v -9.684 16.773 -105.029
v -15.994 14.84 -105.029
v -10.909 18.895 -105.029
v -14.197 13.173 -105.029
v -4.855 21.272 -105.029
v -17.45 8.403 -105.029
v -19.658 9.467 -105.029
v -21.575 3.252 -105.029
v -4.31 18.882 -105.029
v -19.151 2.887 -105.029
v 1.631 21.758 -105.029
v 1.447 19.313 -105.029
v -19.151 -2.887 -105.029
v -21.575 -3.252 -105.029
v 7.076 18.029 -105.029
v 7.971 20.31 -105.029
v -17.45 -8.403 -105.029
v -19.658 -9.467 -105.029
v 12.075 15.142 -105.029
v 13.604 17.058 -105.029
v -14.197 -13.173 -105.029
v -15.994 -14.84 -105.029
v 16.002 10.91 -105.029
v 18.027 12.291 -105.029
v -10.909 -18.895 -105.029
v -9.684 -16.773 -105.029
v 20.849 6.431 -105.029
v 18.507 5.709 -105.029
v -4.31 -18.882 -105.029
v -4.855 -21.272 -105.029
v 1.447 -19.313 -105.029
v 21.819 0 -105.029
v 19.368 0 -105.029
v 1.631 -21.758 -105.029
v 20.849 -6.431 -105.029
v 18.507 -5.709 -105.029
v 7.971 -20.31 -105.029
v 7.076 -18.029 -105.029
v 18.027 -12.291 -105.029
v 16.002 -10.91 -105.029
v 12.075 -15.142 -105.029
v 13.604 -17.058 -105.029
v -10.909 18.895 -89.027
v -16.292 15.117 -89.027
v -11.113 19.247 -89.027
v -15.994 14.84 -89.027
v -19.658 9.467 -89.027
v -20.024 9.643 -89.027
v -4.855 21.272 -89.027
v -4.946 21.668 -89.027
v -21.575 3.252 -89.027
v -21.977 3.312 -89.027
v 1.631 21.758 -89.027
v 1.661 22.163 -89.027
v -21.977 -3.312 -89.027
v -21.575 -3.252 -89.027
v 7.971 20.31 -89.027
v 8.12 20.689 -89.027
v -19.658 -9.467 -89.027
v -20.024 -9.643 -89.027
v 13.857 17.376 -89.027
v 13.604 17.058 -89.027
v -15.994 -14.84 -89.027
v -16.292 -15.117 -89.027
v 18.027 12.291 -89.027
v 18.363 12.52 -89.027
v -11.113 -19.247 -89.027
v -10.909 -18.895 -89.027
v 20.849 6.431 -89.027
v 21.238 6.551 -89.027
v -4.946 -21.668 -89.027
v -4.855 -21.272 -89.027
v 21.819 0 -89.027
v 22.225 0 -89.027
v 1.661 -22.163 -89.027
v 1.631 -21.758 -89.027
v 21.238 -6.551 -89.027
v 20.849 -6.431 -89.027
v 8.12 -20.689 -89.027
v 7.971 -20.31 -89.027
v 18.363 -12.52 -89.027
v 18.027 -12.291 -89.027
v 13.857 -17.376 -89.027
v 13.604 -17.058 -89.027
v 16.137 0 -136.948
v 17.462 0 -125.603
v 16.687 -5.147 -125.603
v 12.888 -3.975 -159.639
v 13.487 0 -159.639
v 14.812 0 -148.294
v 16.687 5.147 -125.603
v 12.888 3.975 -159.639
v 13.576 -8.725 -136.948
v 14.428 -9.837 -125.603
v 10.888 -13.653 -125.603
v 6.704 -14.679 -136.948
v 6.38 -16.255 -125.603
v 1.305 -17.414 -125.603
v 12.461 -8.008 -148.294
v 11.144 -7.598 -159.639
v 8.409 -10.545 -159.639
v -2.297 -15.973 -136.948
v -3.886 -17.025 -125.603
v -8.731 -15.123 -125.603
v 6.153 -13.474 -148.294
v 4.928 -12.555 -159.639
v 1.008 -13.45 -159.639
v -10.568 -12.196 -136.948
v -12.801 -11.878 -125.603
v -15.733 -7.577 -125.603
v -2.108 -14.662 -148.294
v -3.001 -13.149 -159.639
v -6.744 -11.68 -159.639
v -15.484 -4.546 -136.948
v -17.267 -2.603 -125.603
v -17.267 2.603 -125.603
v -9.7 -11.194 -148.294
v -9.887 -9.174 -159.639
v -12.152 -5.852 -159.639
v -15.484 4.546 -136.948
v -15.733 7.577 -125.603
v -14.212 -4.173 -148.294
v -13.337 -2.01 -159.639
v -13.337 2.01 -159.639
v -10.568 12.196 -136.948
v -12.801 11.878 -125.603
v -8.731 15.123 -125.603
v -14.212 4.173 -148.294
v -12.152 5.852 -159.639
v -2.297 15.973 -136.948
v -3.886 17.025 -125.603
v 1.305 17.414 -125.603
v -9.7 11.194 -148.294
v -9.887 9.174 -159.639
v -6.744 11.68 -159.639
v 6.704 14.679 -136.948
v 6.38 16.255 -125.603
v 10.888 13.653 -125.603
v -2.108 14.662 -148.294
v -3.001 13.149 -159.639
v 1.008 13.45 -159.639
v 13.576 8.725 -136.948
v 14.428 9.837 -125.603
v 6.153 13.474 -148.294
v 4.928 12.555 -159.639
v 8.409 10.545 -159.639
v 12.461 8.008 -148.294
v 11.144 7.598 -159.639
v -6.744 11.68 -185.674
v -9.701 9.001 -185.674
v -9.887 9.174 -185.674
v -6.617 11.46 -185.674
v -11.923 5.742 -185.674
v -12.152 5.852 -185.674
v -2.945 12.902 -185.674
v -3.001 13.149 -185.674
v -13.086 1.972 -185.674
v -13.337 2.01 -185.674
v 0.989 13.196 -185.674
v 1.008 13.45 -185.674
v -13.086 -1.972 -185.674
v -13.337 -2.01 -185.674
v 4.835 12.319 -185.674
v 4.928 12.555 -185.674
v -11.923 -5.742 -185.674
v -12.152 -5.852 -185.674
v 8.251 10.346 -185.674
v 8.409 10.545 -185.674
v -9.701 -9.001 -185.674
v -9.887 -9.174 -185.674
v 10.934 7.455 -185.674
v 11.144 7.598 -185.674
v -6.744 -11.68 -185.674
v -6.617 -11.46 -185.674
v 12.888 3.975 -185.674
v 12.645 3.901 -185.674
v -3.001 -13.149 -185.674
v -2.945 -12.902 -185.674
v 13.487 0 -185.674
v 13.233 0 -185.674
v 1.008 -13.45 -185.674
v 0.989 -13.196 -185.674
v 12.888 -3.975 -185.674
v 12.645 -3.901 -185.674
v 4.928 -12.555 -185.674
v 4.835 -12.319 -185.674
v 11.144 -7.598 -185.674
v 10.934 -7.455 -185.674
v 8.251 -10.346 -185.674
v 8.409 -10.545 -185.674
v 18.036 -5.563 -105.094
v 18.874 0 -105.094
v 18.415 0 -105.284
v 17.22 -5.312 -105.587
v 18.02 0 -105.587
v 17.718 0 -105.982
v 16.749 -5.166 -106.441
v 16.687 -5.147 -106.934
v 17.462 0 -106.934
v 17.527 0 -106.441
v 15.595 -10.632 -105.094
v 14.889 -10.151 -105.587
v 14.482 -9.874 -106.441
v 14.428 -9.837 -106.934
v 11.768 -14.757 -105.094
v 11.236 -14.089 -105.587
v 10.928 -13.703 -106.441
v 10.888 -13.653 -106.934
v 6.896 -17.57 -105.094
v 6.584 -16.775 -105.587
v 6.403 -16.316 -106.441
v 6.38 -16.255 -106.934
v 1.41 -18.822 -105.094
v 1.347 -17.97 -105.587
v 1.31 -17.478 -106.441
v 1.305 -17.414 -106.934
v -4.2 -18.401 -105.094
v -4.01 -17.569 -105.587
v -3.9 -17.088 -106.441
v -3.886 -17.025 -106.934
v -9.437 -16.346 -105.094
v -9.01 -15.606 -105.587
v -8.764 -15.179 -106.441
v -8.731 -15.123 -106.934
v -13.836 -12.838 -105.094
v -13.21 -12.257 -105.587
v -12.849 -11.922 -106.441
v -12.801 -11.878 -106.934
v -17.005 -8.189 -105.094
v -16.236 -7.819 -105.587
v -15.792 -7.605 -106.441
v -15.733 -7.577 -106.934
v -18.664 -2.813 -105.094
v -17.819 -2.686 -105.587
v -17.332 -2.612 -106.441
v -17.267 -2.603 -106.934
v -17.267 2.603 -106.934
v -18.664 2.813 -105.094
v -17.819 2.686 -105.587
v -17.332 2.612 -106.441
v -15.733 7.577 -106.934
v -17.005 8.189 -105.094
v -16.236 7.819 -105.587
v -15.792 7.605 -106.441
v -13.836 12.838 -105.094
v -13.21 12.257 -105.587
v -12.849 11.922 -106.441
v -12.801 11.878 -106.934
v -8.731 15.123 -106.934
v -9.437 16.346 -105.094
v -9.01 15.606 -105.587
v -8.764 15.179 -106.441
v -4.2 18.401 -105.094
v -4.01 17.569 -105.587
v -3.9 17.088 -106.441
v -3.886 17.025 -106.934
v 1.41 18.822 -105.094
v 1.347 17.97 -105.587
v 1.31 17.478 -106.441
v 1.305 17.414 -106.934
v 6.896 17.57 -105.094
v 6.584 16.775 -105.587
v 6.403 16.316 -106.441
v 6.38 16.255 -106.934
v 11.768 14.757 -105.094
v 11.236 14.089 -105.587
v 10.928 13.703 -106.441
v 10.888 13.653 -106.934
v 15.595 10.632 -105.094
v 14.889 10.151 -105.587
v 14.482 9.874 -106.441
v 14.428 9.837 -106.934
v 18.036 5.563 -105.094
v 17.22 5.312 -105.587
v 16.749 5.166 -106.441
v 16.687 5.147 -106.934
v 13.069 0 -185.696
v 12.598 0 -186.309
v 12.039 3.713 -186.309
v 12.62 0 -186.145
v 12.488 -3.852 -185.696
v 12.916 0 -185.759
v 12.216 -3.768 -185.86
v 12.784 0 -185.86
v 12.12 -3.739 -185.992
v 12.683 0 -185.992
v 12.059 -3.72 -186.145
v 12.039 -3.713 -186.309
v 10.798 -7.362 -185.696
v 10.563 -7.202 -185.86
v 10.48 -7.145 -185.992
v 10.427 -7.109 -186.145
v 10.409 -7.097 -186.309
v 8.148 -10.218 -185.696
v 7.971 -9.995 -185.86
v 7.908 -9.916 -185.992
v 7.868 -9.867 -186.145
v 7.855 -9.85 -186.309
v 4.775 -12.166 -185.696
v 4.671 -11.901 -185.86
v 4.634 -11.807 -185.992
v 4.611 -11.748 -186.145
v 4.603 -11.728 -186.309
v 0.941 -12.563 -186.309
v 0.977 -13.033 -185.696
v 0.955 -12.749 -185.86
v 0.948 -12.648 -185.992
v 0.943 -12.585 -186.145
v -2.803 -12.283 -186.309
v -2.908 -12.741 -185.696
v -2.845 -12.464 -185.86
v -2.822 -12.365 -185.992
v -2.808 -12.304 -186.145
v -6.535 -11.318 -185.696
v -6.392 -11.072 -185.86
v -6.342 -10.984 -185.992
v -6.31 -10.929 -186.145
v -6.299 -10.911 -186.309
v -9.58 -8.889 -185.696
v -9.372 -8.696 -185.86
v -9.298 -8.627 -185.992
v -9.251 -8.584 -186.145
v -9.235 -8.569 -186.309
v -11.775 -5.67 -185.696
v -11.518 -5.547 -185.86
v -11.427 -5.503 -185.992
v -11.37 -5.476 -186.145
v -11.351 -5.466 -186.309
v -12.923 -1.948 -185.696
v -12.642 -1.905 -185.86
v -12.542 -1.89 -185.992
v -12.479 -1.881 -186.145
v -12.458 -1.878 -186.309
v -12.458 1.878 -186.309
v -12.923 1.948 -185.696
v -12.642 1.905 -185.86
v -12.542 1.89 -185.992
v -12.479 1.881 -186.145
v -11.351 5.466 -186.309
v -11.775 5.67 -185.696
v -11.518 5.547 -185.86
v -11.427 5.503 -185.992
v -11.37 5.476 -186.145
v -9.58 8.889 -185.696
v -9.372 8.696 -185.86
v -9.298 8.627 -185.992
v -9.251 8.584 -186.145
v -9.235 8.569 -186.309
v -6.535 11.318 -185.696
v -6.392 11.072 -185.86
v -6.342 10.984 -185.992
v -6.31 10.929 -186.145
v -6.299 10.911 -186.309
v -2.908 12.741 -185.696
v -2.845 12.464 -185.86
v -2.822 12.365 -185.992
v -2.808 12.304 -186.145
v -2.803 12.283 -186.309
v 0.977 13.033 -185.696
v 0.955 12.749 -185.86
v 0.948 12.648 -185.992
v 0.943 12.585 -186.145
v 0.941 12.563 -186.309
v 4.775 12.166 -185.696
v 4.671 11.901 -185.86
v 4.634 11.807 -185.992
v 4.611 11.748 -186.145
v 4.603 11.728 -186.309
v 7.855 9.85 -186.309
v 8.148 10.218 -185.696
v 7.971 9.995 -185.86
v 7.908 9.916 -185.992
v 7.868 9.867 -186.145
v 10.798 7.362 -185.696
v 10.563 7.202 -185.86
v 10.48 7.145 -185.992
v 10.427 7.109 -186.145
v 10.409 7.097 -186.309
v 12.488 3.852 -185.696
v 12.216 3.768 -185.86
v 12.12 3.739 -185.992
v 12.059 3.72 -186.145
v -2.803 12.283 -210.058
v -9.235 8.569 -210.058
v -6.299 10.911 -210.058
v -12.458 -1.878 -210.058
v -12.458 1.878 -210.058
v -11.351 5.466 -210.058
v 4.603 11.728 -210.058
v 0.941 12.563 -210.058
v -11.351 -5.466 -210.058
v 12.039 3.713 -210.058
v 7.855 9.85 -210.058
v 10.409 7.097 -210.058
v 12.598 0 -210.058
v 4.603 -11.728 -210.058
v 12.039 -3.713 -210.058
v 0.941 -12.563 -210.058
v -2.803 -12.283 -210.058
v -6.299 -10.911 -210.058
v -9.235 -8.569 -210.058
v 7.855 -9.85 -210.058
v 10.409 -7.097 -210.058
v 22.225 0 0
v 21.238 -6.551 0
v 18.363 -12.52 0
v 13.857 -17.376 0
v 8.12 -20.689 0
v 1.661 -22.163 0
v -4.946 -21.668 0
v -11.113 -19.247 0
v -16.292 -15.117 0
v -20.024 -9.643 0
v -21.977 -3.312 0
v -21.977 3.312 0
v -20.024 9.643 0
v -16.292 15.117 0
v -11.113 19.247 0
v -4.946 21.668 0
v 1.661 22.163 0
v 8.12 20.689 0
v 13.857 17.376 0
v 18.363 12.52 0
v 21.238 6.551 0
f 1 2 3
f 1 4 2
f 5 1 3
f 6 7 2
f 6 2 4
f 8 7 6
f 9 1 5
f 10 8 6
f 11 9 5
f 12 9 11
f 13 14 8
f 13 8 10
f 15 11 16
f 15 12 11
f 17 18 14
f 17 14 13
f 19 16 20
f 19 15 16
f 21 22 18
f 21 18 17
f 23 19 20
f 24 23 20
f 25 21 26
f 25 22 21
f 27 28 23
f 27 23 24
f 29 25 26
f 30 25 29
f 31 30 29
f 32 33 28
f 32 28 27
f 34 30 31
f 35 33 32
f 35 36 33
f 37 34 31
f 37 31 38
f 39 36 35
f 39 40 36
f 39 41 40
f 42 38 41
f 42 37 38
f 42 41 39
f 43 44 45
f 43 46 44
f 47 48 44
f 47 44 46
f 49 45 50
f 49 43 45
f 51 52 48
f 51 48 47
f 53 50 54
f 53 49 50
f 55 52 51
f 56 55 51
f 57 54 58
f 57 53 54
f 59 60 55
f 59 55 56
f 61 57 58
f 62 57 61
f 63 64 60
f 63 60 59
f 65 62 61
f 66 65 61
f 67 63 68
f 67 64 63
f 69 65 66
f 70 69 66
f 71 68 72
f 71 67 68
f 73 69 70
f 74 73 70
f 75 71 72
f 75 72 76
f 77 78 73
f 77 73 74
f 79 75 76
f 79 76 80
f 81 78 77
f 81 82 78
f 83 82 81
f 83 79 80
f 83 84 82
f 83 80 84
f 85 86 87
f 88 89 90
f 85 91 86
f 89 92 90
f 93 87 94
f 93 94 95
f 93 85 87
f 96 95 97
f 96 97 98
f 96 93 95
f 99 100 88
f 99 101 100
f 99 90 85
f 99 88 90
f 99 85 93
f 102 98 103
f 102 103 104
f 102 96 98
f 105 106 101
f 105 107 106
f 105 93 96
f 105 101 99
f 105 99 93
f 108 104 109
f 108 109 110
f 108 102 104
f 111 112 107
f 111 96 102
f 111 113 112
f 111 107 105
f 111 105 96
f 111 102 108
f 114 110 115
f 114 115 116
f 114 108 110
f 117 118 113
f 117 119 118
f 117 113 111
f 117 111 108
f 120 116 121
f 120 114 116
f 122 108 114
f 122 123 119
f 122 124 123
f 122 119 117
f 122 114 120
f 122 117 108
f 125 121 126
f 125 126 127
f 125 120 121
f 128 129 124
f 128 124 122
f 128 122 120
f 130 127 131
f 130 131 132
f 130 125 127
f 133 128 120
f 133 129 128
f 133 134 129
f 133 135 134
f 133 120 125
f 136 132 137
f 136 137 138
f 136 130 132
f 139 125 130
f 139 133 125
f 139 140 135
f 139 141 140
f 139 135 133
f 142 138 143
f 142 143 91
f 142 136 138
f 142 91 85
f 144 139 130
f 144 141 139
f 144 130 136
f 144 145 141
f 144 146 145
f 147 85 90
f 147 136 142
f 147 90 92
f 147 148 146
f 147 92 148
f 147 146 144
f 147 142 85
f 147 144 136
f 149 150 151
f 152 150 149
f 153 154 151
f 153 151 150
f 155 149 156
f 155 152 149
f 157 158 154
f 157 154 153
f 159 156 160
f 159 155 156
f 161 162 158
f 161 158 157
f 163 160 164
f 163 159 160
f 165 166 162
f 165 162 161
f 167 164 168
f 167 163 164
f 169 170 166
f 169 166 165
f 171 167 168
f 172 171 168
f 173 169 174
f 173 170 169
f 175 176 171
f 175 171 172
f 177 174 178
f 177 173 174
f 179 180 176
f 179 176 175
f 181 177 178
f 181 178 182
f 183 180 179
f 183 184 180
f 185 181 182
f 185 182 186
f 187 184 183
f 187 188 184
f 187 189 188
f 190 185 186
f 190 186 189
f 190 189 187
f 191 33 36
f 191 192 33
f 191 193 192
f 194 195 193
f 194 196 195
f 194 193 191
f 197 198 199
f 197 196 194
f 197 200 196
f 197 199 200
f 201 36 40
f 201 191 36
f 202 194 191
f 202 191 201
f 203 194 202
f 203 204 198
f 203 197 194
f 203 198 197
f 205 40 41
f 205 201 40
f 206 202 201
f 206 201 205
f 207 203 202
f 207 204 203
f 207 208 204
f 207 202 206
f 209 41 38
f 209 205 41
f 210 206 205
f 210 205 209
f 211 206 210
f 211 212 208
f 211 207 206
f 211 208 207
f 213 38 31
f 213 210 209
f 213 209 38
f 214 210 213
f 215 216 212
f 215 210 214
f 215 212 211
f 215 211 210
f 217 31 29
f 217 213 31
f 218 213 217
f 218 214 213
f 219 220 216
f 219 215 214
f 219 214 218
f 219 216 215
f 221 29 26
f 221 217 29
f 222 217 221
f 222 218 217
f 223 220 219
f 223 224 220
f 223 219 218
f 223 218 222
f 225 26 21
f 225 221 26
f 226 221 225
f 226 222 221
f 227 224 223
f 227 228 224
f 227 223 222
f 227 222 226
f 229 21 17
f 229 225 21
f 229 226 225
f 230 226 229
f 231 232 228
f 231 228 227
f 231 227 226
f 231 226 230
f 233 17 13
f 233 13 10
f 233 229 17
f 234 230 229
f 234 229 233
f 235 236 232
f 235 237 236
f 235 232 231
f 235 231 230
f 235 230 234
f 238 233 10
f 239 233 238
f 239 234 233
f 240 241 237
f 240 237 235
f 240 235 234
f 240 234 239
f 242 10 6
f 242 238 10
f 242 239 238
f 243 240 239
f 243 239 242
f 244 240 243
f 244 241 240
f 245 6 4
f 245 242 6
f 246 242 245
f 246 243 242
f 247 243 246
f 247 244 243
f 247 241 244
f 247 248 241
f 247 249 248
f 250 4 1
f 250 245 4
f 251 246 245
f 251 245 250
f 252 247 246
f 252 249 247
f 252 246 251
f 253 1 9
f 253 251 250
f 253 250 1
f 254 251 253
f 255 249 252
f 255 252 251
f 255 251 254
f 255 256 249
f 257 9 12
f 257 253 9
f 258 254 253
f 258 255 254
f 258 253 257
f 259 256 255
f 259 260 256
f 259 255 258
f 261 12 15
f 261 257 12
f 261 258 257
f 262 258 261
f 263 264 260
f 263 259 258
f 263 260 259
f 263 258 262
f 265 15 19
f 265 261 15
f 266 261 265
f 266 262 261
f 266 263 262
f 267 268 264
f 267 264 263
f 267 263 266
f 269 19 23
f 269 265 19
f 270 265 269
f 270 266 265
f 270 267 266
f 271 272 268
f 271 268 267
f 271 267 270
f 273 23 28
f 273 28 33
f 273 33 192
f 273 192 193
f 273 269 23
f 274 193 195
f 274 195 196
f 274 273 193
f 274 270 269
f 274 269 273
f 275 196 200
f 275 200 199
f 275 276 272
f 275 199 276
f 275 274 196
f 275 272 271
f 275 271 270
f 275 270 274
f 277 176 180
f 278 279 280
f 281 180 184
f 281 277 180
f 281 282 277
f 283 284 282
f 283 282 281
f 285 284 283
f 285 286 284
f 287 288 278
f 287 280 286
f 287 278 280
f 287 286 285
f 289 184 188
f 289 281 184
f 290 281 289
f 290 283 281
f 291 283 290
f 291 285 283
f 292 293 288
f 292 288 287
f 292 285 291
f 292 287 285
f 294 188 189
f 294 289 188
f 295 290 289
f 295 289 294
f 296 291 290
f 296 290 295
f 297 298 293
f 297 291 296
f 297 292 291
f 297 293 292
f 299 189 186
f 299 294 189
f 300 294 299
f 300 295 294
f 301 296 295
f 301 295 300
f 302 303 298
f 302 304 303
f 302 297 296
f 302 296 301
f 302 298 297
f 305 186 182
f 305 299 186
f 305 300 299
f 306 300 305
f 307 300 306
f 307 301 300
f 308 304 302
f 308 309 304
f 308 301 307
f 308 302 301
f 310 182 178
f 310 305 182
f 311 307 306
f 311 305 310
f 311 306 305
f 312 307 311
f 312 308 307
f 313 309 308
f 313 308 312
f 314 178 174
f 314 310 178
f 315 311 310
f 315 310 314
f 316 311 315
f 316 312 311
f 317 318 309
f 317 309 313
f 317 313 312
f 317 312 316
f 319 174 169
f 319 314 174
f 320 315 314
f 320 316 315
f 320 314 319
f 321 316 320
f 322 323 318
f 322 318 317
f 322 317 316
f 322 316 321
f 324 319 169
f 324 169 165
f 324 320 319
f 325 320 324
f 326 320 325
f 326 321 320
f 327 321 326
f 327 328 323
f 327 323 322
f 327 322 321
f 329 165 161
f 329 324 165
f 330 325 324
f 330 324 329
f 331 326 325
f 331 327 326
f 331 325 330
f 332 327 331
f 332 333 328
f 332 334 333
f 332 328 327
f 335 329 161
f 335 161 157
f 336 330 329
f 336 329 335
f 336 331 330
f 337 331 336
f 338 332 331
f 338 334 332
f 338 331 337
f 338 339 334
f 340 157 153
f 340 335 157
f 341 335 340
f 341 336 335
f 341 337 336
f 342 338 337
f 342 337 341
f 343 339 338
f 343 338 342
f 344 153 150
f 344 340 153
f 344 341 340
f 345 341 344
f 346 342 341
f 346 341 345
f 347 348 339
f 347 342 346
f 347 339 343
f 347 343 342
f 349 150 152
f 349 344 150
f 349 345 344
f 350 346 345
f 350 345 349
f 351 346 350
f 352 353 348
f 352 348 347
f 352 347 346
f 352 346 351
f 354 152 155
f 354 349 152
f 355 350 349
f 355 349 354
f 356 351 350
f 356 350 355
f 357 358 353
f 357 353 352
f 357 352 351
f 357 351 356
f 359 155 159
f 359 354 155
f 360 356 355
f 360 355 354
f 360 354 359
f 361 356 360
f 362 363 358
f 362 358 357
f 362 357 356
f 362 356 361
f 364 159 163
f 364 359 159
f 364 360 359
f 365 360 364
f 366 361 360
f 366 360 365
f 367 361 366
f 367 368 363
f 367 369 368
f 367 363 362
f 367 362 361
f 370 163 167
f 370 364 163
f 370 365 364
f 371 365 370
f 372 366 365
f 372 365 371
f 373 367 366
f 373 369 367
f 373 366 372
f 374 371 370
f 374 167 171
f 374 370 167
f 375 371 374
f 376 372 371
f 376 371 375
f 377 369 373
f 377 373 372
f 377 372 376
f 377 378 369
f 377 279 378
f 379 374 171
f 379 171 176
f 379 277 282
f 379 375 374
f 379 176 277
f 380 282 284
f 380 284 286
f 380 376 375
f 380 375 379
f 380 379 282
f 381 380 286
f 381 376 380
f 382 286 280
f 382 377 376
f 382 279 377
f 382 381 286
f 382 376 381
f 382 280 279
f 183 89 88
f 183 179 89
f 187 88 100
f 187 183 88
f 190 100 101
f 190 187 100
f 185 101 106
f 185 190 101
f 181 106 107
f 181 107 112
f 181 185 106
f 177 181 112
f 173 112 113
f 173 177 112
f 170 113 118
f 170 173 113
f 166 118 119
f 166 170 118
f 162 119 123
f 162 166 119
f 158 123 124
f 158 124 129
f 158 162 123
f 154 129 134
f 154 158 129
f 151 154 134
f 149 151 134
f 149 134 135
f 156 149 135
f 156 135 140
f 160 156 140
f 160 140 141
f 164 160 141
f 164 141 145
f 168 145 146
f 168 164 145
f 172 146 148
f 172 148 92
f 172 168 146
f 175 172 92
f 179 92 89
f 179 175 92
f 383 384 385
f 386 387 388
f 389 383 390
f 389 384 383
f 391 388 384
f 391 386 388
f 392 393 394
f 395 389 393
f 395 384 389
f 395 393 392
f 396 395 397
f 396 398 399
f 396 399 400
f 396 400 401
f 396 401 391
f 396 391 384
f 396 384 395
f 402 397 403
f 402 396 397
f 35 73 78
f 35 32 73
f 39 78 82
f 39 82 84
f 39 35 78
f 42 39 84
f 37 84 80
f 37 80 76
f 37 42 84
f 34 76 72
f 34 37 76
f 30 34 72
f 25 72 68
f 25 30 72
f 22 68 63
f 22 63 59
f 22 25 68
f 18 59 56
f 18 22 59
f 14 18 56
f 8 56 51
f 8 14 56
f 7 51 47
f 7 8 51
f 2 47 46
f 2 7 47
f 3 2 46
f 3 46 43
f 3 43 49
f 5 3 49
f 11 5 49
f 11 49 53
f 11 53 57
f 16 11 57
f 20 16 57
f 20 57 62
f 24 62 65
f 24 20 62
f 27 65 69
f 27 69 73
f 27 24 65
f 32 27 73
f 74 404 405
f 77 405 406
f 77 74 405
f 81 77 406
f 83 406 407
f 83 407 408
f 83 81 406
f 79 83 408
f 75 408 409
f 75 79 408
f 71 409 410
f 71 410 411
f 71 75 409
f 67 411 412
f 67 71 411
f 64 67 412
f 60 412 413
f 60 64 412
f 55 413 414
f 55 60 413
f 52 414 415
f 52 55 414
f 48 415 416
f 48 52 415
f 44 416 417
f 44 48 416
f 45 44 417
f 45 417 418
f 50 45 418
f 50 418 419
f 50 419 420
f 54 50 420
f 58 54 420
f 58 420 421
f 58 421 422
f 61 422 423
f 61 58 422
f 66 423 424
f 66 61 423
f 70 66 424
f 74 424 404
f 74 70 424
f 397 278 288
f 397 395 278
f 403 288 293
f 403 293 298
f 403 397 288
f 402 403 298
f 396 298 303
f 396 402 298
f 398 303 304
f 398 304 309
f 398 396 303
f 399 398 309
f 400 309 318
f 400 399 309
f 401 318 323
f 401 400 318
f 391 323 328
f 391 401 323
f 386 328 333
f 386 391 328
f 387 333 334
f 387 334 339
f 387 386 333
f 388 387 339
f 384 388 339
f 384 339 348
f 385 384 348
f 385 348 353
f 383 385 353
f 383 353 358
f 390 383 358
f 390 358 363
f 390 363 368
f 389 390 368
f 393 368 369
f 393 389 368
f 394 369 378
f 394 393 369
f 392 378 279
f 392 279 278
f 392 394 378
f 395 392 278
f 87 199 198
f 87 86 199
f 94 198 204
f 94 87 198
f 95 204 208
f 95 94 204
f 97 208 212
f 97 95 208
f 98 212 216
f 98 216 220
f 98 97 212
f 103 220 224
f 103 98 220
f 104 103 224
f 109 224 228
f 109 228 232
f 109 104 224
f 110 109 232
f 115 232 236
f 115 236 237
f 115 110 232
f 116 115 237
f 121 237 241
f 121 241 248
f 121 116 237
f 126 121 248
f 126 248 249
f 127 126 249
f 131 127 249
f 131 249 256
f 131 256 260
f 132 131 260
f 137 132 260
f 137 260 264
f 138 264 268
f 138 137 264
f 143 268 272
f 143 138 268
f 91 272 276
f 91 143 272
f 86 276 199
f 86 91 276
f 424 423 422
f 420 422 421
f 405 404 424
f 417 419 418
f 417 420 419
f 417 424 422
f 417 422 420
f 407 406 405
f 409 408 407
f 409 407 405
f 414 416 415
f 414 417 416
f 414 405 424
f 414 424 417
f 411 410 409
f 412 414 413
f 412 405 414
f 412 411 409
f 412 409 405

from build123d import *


with BuildPart() as part:
    # Sketch1 → Revolve1 (revolve)
    with BuildSketch(Plane(origin=(0, 0, 0), x_dir=(0, 0, -1), z_dir=(1, 0, 0)), mode=Mode.PRIVATE) as revolve1_sk:
        with BuildLine():
            Line((0, 0), (0, 22.225))
            Line((0, 22.225), (89.027, 22.225))
            Line((89.027, 22.225), (89.027, 21.8186))
            Line((89.027, 21.8186), (105.029, 21.8186))
            Line((105.029, 21.8186), (105.029, 19.3675))
            ThreePointArc((105.029, 19.3675), (105.586961582, 18.020461582), (106.934, 17.4625))
            Line((106.934, 17.4625), (125.603, 17.4625))
            Line((125.603, 17.4625), (159.639, 13.4874))
            Line((159.639, 13.4874), (185.674, 13.4874))
            Line((185.674, 13.4874), (185.674, 13.2334))
            ThreePointArc((185.674, 13.2334), (185.859987194, 12.784387194), (186.309, 12.5984))
            Line((186.309, 12.5984), (188.214, 12.5984))
            Line((188.214, 12.5984), (210.058, 12.5984))
            Line((210.058, 12.5984), (210.058, 0))
            Line((210.058, 0), (0, 0))
        make_face()
    revolve(revolve1_sk.sketch.rotate(Axis((0, 0, 0), (0, 0, -1)), 90), axis=Axis((0, 0, 0), (0, 0, -1)))


solid = part.part
